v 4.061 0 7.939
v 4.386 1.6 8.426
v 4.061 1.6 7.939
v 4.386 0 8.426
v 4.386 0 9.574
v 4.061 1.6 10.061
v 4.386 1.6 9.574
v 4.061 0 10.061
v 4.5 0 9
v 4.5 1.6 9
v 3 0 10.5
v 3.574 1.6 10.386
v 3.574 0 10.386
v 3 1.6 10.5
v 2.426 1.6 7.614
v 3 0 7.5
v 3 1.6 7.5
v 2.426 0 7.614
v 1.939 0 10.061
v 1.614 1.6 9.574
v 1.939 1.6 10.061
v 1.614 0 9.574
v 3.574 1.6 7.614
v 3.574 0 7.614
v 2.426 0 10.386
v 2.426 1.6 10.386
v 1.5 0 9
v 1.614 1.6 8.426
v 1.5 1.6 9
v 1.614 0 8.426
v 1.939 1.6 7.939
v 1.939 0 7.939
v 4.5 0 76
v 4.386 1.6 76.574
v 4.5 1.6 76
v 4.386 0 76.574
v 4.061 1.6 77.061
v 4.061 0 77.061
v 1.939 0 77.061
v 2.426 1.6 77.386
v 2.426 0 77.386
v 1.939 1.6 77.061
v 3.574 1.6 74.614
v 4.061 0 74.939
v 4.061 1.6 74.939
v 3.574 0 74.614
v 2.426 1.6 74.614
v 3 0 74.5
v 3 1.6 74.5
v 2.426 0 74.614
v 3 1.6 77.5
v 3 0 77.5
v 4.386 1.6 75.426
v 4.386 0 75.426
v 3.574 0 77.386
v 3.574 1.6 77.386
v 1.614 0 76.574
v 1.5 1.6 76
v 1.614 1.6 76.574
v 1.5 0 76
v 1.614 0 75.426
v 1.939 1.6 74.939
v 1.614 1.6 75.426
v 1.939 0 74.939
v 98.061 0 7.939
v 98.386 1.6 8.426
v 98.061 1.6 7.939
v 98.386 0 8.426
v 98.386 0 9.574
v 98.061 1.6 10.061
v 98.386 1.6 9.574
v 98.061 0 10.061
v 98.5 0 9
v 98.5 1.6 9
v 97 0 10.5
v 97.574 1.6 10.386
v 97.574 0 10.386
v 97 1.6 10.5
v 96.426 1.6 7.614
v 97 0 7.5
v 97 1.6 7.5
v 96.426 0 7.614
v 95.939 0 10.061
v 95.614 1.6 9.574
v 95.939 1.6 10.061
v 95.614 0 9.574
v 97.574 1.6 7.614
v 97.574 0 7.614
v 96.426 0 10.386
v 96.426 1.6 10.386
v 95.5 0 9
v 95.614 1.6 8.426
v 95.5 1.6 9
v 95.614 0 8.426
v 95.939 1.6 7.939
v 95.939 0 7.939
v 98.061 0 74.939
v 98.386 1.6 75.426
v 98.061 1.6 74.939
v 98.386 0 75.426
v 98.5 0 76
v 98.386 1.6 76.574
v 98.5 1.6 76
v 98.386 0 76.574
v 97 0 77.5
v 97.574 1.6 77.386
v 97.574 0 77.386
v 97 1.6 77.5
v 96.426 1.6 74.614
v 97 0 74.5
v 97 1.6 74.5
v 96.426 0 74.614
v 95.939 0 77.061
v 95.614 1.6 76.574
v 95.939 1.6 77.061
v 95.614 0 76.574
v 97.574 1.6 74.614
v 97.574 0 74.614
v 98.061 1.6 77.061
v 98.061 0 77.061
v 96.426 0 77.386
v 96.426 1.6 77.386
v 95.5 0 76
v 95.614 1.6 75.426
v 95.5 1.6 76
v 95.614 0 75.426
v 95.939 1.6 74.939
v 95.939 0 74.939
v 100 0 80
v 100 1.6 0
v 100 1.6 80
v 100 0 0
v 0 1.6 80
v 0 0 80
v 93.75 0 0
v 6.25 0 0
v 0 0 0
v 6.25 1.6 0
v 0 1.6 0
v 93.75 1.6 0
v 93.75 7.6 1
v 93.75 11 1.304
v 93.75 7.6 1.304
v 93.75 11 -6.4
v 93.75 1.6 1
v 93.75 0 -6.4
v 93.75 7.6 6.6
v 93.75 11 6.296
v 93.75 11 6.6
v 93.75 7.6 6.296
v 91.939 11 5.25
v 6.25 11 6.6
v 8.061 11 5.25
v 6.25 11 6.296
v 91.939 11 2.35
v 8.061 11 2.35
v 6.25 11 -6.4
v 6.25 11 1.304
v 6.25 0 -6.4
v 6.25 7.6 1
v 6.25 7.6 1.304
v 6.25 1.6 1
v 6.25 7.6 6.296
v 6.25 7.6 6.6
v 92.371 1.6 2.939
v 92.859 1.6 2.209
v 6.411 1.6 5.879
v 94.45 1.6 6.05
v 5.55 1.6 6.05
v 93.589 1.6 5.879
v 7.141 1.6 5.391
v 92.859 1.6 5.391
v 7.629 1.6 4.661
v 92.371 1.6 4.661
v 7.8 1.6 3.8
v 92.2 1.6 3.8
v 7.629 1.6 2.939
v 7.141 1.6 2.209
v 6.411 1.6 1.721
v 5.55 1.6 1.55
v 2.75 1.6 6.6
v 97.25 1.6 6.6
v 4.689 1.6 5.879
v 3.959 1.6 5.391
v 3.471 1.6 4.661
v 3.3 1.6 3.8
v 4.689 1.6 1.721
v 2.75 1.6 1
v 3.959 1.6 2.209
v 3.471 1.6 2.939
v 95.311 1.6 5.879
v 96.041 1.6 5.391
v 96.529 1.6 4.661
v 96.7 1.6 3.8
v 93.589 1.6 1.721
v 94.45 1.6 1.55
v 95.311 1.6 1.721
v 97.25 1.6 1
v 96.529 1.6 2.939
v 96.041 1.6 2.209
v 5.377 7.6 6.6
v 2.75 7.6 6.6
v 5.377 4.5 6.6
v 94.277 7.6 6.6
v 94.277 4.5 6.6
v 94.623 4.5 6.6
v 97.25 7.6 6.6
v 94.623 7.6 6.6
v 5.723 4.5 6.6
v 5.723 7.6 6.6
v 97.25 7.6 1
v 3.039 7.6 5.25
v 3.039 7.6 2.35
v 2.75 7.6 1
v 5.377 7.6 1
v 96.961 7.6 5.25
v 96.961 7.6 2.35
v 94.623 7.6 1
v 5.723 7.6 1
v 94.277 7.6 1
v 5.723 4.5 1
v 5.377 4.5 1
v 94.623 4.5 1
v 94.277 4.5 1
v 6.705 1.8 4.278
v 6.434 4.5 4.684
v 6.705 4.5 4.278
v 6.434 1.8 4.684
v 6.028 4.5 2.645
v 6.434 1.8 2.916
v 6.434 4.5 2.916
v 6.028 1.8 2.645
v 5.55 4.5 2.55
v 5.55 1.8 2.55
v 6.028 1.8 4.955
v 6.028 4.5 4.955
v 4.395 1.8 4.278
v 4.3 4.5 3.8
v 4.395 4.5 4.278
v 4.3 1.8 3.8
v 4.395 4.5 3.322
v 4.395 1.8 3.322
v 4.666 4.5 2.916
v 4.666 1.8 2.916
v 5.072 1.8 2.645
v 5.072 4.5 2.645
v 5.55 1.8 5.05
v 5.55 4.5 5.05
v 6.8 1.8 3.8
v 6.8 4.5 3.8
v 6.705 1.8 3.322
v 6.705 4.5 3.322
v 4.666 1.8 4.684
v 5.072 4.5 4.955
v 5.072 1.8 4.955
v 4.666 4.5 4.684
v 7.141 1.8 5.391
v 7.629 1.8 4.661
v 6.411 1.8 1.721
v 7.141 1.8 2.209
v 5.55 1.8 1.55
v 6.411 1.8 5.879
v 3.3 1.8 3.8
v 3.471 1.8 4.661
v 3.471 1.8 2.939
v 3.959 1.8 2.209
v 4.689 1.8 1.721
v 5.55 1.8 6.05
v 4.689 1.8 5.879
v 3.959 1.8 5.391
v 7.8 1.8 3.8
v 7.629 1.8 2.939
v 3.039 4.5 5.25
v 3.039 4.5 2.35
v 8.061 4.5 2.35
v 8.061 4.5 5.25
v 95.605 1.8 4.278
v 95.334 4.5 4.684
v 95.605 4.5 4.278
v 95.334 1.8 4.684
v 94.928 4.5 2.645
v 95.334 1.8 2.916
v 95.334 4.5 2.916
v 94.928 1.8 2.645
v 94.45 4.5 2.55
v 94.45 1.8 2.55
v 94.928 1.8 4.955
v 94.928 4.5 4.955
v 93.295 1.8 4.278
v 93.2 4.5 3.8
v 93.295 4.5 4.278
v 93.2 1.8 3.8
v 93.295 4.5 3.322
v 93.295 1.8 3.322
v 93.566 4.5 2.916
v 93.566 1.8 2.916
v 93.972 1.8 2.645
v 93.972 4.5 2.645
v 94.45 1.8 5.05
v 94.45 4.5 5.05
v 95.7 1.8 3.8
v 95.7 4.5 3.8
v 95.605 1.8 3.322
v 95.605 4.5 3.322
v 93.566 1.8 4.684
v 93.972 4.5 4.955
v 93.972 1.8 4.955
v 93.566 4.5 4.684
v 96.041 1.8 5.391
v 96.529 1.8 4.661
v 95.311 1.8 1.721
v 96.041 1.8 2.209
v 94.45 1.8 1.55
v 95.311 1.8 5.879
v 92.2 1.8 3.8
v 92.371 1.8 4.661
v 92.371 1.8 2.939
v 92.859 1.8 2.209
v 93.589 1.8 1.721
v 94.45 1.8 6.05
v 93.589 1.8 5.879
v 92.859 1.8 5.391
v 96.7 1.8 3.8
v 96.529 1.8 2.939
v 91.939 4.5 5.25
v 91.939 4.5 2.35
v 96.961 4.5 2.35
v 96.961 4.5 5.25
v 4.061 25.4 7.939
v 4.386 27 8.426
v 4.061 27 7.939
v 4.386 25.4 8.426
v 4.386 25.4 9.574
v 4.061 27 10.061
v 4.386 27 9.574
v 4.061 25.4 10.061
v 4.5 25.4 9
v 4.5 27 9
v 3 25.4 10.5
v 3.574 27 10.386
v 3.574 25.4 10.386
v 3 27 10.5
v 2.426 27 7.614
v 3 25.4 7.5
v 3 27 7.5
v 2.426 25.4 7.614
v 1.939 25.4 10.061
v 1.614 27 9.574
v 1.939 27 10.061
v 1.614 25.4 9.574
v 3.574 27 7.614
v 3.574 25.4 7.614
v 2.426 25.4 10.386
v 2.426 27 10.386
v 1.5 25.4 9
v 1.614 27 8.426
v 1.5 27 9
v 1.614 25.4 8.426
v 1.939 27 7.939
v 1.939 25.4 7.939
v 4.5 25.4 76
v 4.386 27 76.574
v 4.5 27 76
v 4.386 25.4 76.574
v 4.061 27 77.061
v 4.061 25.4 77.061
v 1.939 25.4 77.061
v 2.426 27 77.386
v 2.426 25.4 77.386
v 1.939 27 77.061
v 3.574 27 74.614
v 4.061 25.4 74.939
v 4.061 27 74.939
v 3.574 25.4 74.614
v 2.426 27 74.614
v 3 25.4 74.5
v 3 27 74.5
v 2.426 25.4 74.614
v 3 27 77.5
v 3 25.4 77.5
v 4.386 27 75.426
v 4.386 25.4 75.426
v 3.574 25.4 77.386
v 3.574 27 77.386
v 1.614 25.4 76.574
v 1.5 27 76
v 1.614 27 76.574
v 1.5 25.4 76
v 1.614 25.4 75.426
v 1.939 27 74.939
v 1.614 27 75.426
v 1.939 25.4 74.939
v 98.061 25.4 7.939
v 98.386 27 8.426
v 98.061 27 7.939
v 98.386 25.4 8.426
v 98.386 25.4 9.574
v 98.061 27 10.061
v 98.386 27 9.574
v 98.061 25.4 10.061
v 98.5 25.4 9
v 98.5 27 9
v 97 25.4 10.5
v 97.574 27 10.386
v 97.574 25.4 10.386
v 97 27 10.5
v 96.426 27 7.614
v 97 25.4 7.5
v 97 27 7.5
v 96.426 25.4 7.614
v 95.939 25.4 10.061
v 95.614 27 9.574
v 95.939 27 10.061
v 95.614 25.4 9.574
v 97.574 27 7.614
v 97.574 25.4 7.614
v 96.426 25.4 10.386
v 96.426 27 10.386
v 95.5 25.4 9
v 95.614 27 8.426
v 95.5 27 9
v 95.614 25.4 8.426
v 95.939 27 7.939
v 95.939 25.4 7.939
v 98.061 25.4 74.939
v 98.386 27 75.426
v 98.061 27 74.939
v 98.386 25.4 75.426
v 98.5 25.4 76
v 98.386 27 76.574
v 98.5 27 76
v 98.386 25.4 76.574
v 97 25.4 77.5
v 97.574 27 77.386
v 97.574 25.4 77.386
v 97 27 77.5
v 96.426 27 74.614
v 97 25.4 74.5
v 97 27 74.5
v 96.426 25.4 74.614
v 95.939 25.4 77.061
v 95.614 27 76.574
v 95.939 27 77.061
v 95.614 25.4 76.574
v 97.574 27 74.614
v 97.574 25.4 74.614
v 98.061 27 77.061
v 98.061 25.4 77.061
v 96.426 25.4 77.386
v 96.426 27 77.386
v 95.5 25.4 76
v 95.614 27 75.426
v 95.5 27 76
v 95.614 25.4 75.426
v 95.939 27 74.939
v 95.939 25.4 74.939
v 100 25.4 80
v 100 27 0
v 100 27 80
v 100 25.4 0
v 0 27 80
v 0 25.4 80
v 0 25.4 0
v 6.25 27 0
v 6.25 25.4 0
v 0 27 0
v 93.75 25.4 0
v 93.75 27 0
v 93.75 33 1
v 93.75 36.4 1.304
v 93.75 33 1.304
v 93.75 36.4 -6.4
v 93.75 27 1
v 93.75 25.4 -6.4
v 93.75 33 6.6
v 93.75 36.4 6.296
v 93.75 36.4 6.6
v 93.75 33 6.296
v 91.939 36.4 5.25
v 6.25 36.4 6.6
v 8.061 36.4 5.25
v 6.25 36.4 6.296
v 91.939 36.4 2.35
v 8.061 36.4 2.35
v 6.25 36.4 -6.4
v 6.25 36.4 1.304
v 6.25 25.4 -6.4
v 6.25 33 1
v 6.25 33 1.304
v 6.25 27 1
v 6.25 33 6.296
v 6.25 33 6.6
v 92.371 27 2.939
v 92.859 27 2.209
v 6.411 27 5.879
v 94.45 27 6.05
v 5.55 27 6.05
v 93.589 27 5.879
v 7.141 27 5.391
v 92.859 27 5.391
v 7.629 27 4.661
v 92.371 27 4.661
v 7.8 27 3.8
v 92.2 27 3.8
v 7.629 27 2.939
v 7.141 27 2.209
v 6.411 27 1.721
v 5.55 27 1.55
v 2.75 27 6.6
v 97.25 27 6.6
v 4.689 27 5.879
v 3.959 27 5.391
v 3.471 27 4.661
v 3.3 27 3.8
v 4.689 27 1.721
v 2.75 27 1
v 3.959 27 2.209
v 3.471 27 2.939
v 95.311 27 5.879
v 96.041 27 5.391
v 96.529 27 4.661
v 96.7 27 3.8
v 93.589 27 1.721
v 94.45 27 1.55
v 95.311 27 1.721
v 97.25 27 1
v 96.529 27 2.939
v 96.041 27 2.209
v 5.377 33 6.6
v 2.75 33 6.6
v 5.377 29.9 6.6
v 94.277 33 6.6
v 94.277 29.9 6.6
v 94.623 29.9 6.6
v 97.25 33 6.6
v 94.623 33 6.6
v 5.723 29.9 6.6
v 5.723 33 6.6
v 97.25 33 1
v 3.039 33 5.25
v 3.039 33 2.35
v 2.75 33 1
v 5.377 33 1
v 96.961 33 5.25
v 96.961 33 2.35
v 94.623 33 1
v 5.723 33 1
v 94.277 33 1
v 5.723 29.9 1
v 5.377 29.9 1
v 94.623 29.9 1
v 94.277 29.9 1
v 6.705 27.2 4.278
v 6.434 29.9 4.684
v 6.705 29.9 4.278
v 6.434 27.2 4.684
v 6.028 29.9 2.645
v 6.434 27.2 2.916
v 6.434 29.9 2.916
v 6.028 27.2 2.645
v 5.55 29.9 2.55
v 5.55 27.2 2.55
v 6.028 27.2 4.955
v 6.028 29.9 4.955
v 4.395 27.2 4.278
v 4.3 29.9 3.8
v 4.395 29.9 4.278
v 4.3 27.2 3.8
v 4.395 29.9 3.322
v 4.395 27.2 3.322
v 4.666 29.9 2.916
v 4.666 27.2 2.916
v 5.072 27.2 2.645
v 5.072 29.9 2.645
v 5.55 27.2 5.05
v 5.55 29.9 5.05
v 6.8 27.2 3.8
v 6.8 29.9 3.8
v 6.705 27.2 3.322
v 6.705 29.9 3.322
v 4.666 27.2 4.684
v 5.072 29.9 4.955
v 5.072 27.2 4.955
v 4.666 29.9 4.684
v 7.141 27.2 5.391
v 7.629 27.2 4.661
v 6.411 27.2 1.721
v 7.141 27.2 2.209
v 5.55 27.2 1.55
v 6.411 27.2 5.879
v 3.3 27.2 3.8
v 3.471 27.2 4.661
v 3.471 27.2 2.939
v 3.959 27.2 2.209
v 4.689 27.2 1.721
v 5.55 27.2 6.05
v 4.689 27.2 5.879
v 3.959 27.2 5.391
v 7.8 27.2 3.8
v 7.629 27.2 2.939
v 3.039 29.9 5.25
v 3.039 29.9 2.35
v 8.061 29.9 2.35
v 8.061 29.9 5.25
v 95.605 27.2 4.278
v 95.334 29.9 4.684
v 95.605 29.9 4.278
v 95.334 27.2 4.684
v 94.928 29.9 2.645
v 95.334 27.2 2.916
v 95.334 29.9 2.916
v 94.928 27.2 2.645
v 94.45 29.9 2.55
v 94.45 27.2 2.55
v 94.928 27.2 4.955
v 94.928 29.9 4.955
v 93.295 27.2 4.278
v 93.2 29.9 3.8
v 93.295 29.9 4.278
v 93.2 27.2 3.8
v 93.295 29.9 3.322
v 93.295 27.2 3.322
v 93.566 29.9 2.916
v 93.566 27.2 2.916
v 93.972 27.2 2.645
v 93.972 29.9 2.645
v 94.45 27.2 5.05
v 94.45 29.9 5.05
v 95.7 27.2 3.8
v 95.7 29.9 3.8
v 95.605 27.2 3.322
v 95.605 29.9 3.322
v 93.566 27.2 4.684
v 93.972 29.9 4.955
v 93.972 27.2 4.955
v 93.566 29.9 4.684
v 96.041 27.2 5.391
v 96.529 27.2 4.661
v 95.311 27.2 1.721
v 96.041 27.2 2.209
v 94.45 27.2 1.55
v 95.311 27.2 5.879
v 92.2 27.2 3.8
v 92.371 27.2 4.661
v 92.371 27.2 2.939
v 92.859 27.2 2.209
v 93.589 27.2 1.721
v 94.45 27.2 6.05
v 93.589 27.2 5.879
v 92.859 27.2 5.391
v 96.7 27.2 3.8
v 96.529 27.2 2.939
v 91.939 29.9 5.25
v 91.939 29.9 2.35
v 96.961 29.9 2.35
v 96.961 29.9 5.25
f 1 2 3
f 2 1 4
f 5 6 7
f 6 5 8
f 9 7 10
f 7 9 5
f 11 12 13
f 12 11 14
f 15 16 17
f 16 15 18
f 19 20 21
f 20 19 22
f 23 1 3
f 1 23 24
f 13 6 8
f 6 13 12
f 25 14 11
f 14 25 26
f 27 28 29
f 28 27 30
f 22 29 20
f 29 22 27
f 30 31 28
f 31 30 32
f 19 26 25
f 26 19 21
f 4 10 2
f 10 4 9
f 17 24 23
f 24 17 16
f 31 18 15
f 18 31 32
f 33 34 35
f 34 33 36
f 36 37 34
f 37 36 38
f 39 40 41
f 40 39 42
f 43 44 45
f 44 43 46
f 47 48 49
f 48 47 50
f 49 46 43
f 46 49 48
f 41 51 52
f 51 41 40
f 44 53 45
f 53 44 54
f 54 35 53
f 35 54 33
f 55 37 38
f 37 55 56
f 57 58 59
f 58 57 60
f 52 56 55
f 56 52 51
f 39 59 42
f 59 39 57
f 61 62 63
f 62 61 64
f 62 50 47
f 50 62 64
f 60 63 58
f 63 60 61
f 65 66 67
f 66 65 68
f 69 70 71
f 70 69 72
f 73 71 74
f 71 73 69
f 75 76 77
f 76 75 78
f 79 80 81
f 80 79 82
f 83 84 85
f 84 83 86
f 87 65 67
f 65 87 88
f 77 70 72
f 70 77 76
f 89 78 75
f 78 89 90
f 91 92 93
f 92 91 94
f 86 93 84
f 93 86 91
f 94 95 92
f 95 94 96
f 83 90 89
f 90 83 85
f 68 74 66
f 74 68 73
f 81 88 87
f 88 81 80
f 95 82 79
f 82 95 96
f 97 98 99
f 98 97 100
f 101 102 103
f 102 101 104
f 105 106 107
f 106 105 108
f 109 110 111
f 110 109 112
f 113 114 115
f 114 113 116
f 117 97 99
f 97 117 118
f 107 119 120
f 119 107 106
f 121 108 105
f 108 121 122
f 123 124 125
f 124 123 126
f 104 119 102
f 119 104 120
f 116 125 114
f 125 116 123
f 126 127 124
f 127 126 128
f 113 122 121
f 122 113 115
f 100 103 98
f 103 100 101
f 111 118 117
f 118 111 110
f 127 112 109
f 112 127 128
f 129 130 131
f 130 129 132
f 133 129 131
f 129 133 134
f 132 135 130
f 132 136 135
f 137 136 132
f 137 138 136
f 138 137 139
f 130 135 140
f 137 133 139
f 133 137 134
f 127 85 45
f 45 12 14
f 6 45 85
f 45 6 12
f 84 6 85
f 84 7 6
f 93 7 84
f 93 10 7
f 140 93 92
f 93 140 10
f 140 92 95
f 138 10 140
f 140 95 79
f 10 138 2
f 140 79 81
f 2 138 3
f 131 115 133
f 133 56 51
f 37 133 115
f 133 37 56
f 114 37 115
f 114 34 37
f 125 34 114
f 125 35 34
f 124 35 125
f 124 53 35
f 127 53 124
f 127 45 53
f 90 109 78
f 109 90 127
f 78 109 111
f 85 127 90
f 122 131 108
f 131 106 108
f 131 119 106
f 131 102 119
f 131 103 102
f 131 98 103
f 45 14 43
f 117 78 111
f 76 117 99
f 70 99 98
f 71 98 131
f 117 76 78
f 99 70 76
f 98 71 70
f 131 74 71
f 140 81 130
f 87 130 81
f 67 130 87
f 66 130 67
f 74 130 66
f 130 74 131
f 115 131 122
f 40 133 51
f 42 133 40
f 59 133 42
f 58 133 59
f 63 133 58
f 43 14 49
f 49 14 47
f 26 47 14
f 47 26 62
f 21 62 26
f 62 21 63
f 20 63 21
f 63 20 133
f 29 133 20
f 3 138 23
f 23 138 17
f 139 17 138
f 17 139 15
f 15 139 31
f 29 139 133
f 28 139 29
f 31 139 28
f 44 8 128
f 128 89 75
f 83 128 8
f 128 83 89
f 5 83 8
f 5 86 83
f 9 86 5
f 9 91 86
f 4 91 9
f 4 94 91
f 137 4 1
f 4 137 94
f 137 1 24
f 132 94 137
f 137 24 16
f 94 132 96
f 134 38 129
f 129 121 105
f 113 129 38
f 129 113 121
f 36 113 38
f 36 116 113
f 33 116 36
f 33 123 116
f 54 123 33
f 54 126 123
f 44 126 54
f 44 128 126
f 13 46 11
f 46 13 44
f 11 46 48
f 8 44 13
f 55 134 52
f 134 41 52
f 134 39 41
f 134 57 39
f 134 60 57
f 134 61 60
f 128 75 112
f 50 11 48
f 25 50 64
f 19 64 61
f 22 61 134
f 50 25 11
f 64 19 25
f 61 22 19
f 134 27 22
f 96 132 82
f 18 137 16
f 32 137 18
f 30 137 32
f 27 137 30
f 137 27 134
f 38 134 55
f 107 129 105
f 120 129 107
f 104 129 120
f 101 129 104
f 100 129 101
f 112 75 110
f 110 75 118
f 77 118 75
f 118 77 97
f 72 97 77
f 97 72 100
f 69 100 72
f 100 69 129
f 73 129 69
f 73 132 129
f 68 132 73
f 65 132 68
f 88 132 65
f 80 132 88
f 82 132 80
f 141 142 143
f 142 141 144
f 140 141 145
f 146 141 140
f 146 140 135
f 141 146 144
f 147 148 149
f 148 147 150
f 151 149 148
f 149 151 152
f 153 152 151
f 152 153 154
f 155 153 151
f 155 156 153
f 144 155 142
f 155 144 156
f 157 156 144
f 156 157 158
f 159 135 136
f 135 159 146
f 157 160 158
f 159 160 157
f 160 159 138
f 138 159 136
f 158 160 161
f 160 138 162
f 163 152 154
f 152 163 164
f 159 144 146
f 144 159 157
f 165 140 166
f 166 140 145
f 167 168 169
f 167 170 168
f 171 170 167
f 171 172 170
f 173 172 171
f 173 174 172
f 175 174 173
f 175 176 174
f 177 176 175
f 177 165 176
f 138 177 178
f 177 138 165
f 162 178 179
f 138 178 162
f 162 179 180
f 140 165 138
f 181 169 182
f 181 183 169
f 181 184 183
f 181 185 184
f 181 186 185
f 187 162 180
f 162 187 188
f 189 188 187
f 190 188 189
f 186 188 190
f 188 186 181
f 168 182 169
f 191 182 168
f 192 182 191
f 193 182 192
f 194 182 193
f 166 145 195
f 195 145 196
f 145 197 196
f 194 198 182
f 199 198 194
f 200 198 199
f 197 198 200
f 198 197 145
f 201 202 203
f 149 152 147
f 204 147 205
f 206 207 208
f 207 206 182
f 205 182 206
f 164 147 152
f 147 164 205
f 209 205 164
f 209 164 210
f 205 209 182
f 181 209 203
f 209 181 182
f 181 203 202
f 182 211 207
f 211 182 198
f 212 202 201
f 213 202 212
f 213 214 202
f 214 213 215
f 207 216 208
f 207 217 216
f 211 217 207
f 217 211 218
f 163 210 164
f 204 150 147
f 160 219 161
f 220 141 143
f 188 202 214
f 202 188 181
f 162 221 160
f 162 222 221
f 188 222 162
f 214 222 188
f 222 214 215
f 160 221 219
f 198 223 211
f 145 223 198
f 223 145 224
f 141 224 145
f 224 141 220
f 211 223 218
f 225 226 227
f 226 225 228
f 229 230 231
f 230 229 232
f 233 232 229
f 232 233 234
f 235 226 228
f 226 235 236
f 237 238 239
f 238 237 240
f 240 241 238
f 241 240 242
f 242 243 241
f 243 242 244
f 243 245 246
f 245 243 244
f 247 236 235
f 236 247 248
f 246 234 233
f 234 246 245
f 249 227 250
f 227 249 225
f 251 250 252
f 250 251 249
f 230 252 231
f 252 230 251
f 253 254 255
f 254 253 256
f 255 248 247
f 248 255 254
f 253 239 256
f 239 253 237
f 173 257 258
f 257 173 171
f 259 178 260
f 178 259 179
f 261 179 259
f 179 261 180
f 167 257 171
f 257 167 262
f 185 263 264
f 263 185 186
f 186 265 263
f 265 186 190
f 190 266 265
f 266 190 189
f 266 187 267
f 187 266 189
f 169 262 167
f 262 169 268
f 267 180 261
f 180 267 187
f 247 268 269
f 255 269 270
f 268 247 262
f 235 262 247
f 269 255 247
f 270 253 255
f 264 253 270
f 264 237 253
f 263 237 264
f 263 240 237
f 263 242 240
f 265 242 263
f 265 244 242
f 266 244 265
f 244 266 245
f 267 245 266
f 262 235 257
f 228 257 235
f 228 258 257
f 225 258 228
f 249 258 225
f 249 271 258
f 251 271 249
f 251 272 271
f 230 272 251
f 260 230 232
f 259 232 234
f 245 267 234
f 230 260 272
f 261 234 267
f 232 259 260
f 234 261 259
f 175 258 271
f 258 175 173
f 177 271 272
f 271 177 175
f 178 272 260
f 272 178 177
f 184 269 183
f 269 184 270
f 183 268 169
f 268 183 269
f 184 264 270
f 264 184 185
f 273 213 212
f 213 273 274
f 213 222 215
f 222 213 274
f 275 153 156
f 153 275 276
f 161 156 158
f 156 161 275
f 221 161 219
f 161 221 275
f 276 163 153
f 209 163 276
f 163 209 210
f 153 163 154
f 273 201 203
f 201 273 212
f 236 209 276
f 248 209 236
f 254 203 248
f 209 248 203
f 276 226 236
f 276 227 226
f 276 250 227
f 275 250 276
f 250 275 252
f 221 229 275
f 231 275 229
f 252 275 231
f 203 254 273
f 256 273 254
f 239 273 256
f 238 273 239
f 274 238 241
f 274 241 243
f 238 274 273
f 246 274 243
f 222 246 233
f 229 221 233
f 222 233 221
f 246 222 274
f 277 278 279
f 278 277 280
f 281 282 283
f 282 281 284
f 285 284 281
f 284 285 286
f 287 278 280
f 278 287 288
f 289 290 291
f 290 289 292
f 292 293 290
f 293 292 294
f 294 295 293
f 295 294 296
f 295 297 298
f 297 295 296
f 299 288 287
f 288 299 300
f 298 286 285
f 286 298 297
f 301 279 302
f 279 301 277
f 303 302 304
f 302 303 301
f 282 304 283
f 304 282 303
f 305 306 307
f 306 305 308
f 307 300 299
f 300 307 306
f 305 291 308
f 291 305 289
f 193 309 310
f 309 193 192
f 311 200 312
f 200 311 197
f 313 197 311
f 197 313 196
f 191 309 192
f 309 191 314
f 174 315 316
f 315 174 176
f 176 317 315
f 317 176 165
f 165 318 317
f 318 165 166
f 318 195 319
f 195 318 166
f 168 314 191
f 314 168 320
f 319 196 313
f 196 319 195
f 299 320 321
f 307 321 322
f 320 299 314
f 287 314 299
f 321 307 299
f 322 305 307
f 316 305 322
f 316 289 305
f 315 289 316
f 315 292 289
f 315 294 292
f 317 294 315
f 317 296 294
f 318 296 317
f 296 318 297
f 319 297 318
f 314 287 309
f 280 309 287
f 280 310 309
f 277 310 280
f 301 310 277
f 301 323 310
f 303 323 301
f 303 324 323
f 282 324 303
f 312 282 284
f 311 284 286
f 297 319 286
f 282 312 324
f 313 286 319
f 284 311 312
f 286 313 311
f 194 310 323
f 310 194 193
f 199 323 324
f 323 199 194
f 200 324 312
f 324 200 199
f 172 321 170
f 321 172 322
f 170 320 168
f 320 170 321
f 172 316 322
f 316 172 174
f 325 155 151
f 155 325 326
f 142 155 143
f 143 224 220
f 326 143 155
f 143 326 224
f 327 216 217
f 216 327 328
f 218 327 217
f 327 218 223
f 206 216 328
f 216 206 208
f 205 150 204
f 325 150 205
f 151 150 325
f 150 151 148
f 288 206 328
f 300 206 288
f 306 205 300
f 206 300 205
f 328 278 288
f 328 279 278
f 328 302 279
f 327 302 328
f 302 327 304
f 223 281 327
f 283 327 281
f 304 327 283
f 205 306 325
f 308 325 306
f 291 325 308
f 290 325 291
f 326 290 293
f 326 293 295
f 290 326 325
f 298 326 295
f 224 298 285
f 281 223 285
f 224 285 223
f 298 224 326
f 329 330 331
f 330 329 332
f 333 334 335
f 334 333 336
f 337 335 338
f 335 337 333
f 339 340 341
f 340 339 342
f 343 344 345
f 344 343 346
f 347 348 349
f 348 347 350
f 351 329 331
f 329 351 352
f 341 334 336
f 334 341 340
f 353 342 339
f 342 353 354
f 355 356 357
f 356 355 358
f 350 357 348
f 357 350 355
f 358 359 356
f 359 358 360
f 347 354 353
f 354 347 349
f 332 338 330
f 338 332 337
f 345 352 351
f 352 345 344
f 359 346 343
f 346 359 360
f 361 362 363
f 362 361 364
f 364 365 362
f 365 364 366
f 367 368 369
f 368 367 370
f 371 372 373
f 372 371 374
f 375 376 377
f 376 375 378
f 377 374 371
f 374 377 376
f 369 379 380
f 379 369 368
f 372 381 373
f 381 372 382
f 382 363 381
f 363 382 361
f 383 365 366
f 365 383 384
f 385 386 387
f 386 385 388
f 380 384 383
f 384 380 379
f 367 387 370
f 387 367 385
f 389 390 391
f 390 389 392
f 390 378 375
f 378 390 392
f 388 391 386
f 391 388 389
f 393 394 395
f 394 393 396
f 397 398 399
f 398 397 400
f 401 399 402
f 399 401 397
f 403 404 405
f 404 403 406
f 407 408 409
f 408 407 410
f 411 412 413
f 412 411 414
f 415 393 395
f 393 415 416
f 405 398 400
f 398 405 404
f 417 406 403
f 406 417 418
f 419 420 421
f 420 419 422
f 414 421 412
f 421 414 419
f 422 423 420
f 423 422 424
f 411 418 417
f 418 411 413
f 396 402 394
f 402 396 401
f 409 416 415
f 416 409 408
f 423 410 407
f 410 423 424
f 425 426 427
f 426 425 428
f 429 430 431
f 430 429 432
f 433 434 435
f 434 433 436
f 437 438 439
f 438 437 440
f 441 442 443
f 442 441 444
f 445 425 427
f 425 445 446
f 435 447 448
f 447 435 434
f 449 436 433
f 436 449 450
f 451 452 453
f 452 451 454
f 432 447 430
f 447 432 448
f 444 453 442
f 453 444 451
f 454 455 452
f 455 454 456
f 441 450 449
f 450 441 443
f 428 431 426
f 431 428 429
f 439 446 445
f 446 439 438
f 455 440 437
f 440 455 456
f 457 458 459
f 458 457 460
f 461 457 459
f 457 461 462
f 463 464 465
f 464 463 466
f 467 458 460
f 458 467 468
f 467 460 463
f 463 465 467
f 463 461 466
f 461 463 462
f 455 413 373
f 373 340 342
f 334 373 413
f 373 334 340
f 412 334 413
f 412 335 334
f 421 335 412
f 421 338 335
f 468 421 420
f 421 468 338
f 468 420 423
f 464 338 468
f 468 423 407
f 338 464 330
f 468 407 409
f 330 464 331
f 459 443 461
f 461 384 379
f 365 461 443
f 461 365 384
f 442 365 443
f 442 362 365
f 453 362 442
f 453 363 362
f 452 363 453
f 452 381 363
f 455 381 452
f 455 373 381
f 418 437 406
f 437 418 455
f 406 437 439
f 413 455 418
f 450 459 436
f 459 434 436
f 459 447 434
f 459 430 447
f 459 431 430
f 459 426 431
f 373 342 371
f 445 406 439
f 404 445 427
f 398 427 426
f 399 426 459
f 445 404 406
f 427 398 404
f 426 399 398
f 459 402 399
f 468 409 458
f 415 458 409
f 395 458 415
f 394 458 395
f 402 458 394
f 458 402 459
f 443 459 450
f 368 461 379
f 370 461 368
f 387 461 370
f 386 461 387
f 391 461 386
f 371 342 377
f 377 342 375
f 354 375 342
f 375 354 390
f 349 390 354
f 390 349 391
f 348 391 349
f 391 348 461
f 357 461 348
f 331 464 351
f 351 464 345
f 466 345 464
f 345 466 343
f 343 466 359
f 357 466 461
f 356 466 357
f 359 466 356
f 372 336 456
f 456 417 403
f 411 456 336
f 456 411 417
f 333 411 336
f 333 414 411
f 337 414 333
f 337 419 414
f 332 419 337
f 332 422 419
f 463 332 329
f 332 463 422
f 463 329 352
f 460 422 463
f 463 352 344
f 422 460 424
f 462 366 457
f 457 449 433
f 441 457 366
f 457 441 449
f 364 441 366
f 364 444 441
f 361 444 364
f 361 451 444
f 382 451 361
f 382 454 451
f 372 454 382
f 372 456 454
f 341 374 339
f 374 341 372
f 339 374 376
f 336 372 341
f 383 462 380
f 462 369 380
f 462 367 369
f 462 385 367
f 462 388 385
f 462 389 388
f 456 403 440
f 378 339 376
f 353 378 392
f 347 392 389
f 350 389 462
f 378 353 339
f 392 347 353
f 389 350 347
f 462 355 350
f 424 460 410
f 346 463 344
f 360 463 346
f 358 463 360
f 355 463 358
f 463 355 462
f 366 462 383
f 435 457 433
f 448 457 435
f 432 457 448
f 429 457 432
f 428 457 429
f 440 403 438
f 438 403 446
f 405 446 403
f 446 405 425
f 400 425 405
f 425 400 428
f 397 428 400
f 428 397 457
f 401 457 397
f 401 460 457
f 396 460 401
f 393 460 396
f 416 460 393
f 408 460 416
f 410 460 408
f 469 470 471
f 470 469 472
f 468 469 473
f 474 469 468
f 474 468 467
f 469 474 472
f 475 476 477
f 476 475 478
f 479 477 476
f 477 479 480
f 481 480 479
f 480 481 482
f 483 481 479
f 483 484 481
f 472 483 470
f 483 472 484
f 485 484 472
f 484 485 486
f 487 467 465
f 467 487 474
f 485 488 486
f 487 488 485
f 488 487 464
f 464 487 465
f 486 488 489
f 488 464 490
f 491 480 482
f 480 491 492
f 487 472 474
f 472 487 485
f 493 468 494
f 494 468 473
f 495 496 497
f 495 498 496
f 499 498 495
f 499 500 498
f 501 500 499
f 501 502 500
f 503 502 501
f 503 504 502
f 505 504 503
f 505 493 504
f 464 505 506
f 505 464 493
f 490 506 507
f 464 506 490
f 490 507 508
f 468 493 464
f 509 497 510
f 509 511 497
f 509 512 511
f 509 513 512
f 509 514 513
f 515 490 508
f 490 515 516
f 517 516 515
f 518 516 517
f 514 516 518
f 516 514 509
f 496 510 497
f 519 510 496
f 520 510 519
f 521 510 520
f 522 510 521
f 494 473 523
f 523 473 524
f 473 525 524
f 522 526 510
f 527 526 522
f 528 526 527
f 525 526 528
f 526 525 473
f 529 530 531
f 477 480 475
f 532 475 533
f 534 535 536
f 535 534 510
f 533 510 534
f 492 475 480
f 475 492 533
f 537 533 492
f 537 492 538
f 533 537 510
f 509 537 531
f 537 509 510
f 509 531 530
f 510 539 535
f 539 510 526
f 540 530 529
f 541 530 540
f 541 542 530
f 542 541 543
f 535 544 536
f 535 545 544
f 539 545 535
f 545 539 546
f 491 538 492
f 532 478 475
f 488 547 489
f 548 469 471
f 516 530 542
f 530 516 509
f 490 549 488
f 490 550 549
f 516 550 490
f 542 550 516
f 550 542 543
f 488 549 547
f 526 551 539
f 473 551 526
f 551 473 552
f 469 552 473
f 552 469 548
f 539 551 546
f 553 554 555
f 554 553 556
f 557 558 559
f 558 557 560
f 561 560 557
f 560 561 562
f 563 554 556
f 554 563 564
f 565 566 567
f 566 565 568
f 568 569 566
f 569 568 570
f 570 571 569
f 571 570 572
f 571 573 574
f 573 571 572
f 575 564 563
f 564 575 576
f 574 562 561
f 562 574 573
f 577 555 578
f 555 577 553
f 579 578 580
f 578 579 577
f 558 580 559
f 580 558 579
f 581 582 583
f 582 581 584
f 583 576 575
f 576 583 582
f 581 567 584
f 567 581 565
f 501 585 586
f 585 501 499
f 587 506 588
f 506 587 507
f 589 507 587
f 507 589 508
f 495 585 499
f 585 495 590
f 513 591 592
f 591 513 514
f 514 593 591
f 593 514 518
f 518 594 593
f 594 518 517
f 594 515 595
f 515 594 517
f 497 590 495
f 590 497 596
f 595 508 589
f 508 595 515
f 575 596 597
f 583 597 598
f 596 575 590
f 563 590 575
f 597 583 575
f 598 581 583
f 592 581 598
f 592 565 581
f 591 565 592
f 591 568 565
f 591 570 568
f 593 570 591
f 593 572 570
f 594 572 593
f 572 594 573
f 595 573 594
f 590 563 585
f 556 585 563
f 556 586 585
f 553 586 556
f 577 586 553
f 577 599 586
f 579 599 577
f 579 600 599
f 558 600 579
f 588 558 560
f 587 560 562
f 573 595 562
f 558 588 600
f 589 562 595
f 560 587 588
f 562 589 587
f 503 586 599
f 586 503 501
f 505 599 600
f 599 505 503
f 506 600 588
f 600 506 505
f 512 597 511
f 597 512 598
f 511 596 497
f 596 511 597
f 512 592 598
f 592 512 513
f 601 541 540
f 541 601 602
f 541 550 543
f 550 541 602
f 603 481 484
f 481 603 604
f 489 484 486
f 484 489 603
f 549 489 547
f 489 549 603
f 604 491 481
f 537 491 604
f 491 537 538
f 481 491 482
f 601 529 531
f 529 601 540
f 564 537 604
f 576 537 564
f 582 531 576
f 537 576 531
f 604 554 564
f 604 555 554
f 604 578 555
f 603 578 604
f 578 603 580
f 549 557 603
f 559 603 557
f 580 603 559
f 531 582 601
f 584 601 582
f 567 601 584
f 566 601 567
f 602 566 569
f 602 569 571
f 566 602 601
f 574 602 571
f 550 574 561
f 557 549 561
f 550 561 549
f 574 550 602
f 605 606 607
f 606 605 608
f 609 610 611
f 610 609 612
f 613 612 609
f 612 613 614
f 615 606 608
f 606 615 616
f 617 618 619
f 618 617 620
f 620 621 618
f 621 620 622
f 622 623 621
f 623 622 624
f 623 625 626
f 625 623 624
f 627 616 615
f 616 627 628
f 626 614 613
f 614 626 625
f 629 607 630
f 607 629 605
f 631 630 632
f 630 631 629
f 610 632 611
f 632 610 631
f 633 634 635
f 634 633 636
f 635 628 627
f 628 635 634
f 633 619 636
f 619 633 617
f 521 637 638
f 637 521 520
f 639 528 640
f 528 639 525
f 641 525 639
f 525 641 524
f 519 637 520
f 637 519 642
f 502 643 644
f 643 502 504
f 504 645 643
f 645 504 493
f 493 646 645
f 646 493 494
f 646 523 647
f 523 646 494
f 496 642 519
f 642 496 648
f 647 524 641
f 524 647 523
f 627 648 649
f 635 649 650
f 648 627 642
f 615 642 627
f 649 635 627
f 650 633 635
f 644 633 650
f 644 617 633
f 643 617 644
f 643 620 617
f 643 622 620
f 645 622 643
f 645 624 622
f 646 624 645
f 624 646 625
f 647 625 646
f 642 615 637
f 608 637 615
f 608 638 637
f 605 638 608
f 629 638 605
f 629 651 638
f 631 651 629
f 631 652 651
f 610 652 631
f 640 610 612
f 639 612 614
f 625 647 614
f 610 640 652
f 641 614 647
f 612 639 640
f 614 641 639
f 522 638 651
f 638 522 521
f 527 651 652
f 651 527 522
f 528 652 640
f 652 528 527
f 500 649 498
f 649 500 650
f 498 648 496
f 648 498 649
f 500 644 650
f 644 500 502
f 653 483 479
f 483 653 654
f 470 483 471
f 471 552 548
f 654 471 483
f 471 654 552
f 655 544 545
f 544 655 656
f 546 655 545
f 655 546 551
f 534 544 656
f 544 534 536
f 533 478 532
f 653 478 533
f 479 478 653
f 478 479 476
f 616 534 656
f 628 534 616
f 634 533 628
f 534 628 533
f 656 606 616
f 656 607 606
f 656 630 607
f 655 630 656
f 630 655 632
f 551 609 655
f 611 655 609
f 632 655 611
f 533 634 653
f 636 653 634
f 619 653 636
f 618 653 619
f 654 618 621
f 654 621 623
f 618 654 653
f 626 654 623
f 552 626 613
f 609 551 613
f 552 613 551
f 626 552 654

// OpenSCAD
// file: ../library/linurs/linurs_screw.scad
// Metric screws and nuts 
// urs@linurs.org 2019
// It is targeted for 3D printing applications. 
// To look realistic is not the goal (Example: Nuts do not have a hole)

include <linurs_screw_dim.scad>

d=0; //[0:M2_5,1:M3,2:M4,3:M5]
type=0;//[0:head_cyl,1:head_cnt,2:head_no,3:head_hex]
w=15; 
i=10;
nut_sink=0;
screw_sink=0; 
t=0.01;
fn=16;

/* [hex_bolt] */
show_hex_bolt=false;

/* [nut] */
show_nut=false;

/* [screw] */
show_screw=false;

/* [screw_fix] */
show_screw_fix=false;

/* [screw_cut] */
show_screw_cut=false;

/* [nut_cut] */
show_nut_cut=false;
wi=0; 
rot=false;

// functions used multiple times to position nuts and heads
function headh_cyl(d)=screw_cyl[d][1];  // height of cyl screw head
function headh_cnt(d)=screw_cyl[d][1];  // height of cnt screw head
function headh(d,type=head_cyl)=(type==head_cyl ? headh_cyl(d) : (type==head_cnt ? headh_cnt(d) : 0 )); // height of screw head 

function nuth(d)=screw_hex[d][2];   // height of hex nut

// head of a cylinder screw
module screw_head_cyl(d=M3, t=0)
{
  screwhd=screw_cyl[d][0]+t; // diameter of cylinder screw head
  cylinder(d=screwhd,h=headh(d=d, type=head_cyl), center=true,$fn=16); // screw head
}

// head of a countersunk screw
module screw_head_cnt(d=M3, t=0)
{
  screwd=screw_d[d]+t; 
  screwhd=screw_cnt[d][0]+t; // diameter of cylinder screw head
  cylinder(d1=screwd,d2=screwhd,h=headh(d=d,type=head_cnt), center=true,$fn=16); // screw head
}

// head of a hex screw
module screw_head_hex(d=M3, t=0)
{
    translate([0,0,-nuth(d)/2])nut(d=d, t=t);
}

// head of all screws
module screw_head(d=M3, type=head_cyl, t=0)
{ 
  if(type==head_cnt){
    screw_head_cnt(d=d, t=t);
  } else {
    if(type==head_cyl){
      screw_head_cyl(d=d, t=t);
    } else {
       if(type==head_hex){
           screw_head_hex(d=d, t=t); 
       } 
    }    
  }
}

// hex bolt 
module hex_bolt(d=M3, w=10, t=0)
{
  nutd=screw_hex[d][1]+t; // outer diameter of hex bolt
  cylinder(r=nutd/2,h=w+t, center=true,$fn=6); // nut
}

// nut 
module nut(d=M3, t=0)
{
  hex_bolt(d=d, w=nuth(d), t=t);    
}

// screw 
// w outer width of the screw = screw length + head 
module screw(w=10, d=M3, type=head_cyl, t=0){
  screwd=screw_d[d]+t;       // screw diameter
  cylinder(d=screwd, h=w, center=true,$fn=16); // screw thread length
  translate([0,0,w/2-headh(d=d,type=type)/2])
  screw_head(d=d,type=type, t=t);
}

// screw fix
// w outer width of the screw = screw length + head 
// sink additional material below to remove 
// raise additional material above to remove
module screw_fix(w=10, d=M3, type=head_cyl, screw_sink=0, nut_sink=0, t=0){
  screw(w=w, d=d, type=type, t=t);
  translate([0,0,-w/2+nuth(d)/2])
    nut(d=d,t=t);
  //additional material to be removed above the nut  
  translate([0,0,-(w+nut_sink)/2])hex_bolt(d=d,w=nut_sink+0.01,t=t);    
  //additional material to be removed above the screw head
  if(type==head_cnt){  
    translate([0,0,w/2+screw_sink])
    cylinder(d=screw_cnt[d][0]+t,h=screw_sink+0.01,center=true,$fn=16);
  }else{ 
    translate([0,0,(w+screw_sink)/2])
    cylinder(d=screw_cyl[d][0]+t,h=screw_sink+0.01,center=true,$fn=16);
  }     
}

// screw cut
// material to be extracted from object to slide in a counter sunk screw for fixation
// w height of the cut out
// i depth of the screw
module screw_cut(d=M3,w=20,i=10,t=0,fn=32){
    hsh=screw_cnt[d][1];
    ws=screw_cnt[d][0]+t;
    ds=screw_d[d]+t;
    
    translate([i/2,0,-(w-hsh)/2])
      cube([i,ws,hsh],center=true);
    
    translate([0,0,-(w-hsh)/2])
      cylinder(d=ws,h=hsh,center=true,$fn=32);
    
    translate([0,0,-(w-hsh)/2+hsh])
        cylinder(d2=ds, d1=ws, h=hsh,center=true,$fn=fn);
    
    cylinder(h=w, d=ds, center=true, $fn=fn);   
    
    translate([i/2,0,0]) 
        cube([i,ds,w],center=true);
    
    for(y=[-1,1]){
        translate([i/2,y*ds/2,-w/2+hsh])
            rotate([45,0,0])
            cube([i,sqrt(2)*(ws-ds)/2,sqrt(2)*(ws-ds)/2],center=true);
    }
}
//screw_cut();

// nut cut
// material to be extracted from object to slide in a nut for fixation
// w height of the cylinder
// i lenght of the inlet
module nut_cut(w=10, wi=0, d=M3, i=10, t=0, rot=false,type=head_cyl){ 
  r=(rot)?90:0;
  ds=(rot)?screw_hex[d][1]:screw_hex[d][0];
  rotate([0,0,r])nut(d,t);
  translate([i/2,0,0])
    cube([i,ds+t,nuth(d)+t],center=true);
  translate([0,0,-wi])
      if(type==head_cnt){    
          screw(w=w, d=d, type=type, t=t); 
        translate([0,0,w/2])
          cylinder(d=screw_cnt[d][0]+t,h=raise,center=true,$fn=16);
      }
      else{ 
          screw(w=w, d=d, type=type, t=t);   
  //      translate([0,0,0])
          //#cylinder(d=screw_cyl[d][0]+t,h=w,center=true,$fn=16);
      }       
}

if(show_hex_bolt==true){
   hex_bolt(d=d, w=w, t=t);
}

if(show_nut==true){
  nut(d=d, t=t);
}    

if(show_screw==true){
   screw(w=w, d=d, type=type, t=t);
}

if(show_screw_fix==true){
  screw_fix(w=w, d=d, type=type, nut_sink=nut_sink, screw_sink=screw_sink, t=t);
}

if(show_screw_cut==true){
  screw_cut(d=d,w=w,i=i,t=t,$fn=fn);
}    

if(show_nut_cut==true){
  nut_cut(w=w, wi=wi, d=d, i=i, t=t,rot=rot,type=type);
}  
// file: ../library/din41612/din41612_male_dim.scad
include <../linurs/linurs_screw_dim.scad>

// connector dimensions
din41612_male_l=94.5;    // lenght of the connector
din41612_male_l1=87.5;   // 
din41612_male_w=13;      // width of the connector
din41612_male_w1=6.4;    // 
din41612_male_w2=5.6;    // 
din41612_male_h=11;      // height of the connector
din41612_male_h1=1.6;    // 
din41612_male_h2=6;      // 

din41612_male_dl=88.9;   // distance between mounting holes
// file: ../library/din41612/din41612_female_dim.scad
include <../linurs/linurs_screw_dim.scad>

// connector dimensions
din41612_female_l=95;       // lenght of the connector
din41612_female_l1=85;      // lenght of the connector head
din41612_female_h=11.6;     // height of the connector
din41612_female_h1=5.2;     // height produced by the connector when pulgged in 
din41612_female_w=11;       // width of the connector
din41612_female_w1=8.5;     // width of the connector head

din41612_female_dl=90;      // distance between mounting holes
// file: ../library/linurs/linurs_screw_dim.scad
// Metric screws and nuts 
// urs@linurs.org

// contains dimensions of linurs_screw and can be included in other 
// OpenScad files 

// Parameters in this file
// d screw diameter M2_5, M3, ... (enumeration with screw_d)
// t millimeters added to diameters 

// enumerations of metric threads
M2_5=0;
M3=1;
M4=2;
M5=3;

// enumerations screw head type
head_cyl=0; // cylinder
head_cnt=1; // countrsunk
head_no=2;  // no head at all
head_hex=3;  // no head at all

// screw diameters
screw_d=[
2.5, // M2.5
3.0, // M3
4.0, // M4
5.0  // M5
];

// sizes for hex nuts
screw_hex=[
//   s,   e,   h
 [ 5.0, 5.8, 1.7], // M2.5
 [ 5.5, 6.4, 2.0], // M3
 [ 7.0, 8.1, 2.8], // M4
 [ 8.0, 9.2, 3.5]  // M5
];

// sizes for cylinder screw heads
screw_cyl=[
//   d,   h
 [ 4.5, 1.6], // M2.5
 [ 5.5, 2.0], // M3
 [ 7.0, 2.6], // M4
 [ 8.5, 3.3]  // M5
];

// sizes for countersunk screw heads
screw_cnt=[
//   d,   h
 [ 4.7, 1.50], // M2.5
 [ 5.6, 1.65], // M3
 [ 7.4, 2.20], // M4
 [ 9.2, 2.50]  // M5
];
// file: ../library/din41612/din41612_male.scad
// din41612 male connector
// =======================

include <din41612_male_dim.scad>

use <../linurs/linurs_screw.scad>

module din41612_male(){ 
  // color("LightGrey")
  difference(){
    union(){
        translate([0,din41612_male_w1/2,din41612_male_h/2-din41612_male_h1])  
        cube([din41612_male_l1,
              din41612_male_w1,
              din41612_male_h],
             center=true);  
      translate([0,(din41612_male_w1-din41612_male_w)/2,(din41612_male_h-din41612_male_h1)/2]) 
        cube([din41612_male_l1,
              (din41612_male_w-din41612_male_w1),
              din41612_male_h-din41612_male_h1],
             center=true);  
      translate([0,din41612_male_w2/2+din41612_male_w1-din41612_male_w,din41612_male_h2/2])
        cube([din41612_male_l,
              din41612_male_w2,
              din41612_male_h2],
             center=true);  
    }
    for(i=[-1,1]){ // mounting holes
      translate([i*din41612_male_dl/2,
                 din41612_male_w1-din41612_male_w+din41612_male_w2/2, 
                 din41612_male_h1])
      rotate([180,0,90])screw_fix(
            w=din41612_male_h2, 
            d=M2_5, 
            type=head_cyl, 
            nut_sink=din41612_male_h,
            t=0);
    }
  }
}
din41612_male();  
// file: ../motherboard/motherboard_dim.scad
include <../library/linurs/linurs_screw_dim.scad>
include <../library/din41612/din41612_female_dim.scad>
include <../library/din41612/din41612_male_dim.scad>
include <../pcb/pcb_dim.scad>
// motherboard pcb dimensions
motherboard_l=pcb_l;   // pcb width
motherboard_h=1.6;     // pcb thickness
step=25.4;             // distance between modules

function motherboard_w(n)=din41612_female_w+step*(n-1);

screw_motherboard_d=M2_5;
screw_motherboard_l=16;
motherboard_pass=0.5;// gap to fit screws 

motherboard_z_offset=-din41612_male_w1-din41612_female_h1-motherboard_h;
// file: pcb_dim.scad
// The pcb is the master object of the project
// therefore no other include files from other objects
// are necessary

// pcb constants
pcb_l =100;  // lenght of the pcb
pcb_ld = 94; // hole distance 
pcb_w=80;    // height of the pcb
pcb_wd = 67; // hole distance
pcb_wd1 = 9; // hole to edge distance 
pcb_d=3;     // diameter of holes
pcb_h=1.6;   // thickness
// main file
// pcb
// ===
// The pcb is the master object and has its 
// lower left corner solder side at the origin of the 
// coordinate system 

n=2;  // [1,2,3,4,5,6,7,8]
show_pcb="assemblies"; // [assemblies,assembly,pcb]

include <pcb_dim.scad>
include <../motherboard/motherboard_dim.scad>

use <../library/din41612/din41612_male.scad>

module pcb(){
  echo("pcb");  
  color("greenyellow")
  difference(){
    cube([pcb_l,pcb_h,pcb_w]); // pcb
    for(x=[-1,1]){ // mounting holes
      for(y=[pcb_wd1,pcb_wd1+pcb_wd]){
        translate([x*pcb_ld/2+pcb_l/2,0,y])
        rotate([90,0,0])
        cylinder(d=pcb_d,h=3*pcb_h,center=true,$fn=16);
      }
    }
  }
}

module pcb_assembly(){
  echo("pcb assembly");  
  pcb();  
  translate([pcb_l/2,pcb_h,0])  
  rotate([-90,0,0])din41612_male();  
}

module pcb_assemblies(n=1){
  echo("pcb assemblies"); 
  for(i=[0:n-1]){ // add the connectors
      echo(i);
      translate([0,step*i,0])
      pcb_assembly();
  }    
}    

if(show_pcb=="assemblies"){
  pcb_assemblies(n=n);
}

if(show_pcb=="assembly"){
  pcb_assembly();
}

if(show_pcb=="pcb"){
    // Move to center to create 2D drawings from top view 
    // with script OpenSCAD22d.py
    //
    rotate([90,0,180])
    //
    translate([-pcb_l/2,-pcb_h/2,-pcb_w/2])
    pcb();
}
